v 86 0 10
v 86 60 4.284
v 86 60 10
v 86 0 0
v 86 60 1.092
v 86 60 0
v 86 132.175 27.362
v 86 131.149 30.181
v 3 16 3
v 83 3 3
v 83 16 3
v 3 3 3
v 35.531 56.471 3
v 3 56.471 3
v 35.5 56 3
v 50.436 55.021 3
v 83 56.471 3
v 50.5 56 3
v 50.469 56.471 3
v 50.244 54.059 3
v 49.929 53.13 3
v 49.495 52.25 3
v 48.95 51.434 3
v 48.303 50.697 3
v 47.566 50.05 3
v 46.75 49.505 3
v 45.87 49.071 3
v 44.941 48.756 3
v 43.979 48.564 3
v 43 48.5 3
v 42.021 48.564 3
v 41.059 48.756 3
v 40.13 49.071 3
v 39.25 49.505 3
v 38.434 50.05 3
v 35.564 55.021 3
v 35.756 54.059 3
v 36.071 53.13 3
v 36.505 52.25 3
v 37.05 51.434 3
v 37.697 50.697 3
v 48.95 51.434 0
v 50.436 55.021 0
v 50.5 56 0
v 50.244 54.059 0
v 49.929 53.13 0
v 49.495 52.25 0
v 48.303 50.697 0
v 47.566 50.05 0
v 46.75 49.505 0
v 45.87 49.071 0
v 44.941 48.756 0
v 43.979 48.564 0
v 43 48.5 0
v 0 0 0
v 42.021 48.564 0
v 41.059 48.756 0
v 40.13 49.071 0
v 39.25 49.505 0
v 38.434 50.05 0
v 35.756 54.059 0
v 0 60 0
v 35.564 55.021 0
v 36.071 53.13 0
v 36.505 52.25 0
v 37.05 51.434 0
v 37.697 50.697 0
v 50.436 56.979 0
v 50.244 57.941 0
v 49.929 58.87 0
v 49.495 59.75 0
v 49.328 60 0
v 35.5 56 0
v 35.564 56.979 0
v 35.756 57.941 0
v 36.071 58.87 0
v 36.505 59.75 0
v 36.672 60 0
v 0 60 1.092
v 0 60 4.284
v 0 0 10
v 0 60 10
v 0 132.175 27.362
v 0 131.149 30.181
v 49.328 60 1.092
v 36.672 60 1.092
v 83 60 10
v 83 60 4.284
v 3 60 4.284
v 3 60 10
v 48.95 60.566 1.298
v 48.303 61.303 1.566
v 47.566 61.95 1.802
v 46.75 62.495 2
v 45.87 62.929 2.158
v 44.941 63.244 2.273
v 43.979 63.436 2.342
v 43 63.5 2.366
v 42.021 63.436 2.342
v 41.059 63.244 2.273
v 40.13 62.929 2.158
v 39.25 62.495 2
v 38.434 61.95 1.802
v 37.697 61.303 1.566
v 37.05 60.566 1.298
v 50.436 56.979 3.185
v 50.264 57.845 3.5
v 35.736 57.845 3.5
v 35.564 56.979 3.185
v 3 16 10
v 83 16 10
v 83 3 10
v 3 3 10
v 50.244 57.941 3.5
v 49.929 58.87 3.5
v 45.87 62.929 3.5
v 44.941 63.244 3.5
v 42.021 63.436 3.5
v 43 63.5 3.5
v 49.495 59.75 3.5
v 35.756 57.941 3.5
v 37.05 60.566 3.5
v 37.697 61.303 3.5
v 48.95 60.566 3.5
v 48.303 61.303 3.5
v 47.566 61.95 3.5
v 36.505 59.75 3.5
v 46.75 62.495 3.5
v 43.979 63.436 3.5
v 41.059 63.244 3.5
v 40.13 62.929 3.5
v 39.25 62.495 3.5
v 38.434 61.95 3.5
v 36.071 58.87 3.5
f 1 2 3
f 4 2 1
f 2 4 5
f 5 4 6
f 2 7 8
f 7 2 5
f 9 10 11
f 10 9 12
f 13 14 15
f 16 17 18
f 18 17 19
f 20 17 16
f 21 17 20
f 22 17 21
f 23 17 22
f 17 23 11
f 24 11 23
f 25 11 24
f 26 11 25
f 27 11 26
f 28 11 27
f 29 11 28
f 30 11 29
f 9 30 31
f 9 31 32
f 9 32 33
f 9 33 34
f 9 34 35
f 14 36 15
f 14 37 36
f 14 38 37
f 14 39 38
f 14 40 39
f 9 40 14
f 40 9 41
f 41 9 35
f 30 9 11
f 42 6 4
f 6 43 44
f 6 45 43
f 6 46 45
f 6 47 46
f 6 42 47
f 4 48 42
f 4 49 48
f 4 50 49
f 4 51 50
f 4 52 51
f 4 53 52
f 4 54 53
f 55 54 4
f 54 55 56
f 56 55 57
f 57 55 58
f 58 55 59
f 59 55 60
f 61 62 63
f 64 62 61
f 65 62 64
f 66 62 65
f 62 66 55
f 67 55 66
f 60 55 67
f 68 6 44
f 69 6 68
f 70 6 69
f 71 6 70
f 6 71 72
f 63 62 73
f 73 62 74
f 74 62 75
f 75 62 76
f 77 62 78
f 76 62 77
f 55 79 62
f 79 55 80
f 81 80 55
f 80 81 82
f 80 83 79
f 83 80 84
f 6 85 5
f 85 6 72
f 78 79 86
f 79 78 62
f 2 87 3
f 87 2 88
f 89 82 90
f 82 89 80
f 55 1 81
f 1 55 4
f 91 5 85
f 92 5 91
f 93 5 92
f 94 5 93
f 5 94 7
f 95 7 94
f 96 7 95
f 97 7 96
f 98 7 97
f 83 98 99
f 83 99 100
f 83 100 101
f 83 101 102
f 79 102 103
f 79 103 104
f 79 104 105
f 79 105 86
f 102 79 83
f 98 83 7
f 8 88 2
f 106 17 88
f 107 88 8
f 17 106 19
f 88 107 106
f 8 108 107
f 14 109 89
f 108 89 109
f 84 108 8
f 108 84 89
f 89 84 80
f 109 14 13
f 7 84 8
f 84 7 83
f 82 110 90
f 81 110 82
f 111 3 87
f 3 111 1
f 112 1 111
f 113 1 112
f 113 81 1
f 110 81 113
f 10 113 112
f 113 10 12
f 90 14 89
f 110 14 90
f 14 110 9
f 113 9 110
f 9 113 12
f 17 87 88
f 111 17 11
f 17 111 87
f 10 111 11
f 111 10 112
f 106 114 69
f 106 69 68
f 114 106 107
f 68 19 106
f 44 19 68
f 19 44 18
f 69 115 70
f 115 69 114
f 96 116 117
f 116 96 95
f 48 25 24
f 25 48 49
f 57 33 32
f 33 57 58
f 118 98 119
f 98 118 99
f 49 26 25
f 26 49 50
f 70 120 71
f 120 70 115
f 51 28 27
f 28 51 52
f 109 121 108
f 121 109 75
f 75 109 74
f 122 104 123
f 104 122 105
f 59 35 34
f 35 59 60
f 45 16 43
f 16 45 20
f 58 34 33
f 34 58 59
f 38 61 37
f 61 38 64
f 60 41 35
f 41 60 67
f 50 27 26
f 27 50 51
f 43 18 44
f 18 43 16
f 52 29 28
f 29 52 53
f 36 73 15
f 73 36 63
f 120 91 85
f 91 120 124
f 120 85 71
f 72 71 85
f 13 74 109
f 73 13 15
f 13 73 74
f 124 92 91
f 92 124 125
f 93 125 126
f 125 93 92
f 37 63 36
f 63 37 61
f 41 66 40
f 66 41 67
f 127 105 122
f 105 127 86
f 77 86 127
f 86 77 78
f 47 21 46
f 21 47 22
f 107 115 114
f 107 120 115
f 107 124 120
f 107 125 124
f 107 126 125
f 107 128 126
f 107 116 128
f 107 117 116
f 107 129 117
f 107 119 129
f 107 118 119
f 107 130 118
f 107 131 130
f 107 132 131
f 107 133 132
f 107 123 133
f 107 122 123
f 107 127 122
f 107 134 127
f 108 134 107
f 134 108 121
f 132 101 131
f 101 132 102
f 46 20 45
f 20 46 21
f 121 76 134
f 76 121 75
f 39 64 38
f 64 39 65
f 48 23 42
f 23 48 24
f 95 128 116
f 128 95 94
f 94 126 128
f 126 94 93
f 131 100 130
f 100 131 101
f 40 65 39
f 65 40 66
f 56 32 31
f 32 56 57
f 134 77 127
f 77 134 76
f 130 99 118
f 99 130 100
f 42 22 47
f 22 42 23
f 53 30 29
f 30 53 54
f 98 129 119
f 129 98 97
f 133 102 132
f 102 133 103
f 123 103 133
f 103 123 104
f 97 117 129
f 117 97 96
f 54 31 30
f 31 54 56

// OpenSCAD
// Phone stand — adjustable viewing angle
// Fits phones up to 80mm wide, 12mm thick

$fn = 48;

phone_width = 80;
phone_thickness = 12;
stand_depth = 60;
stand_height = 80;
wall = 3;
angle = 70; // viewing angle from horizontal
lip_height = 10;

module phone_stand() {
    difference() {
        union() {
            // Base plate
            cube([phone_width + wall * 2, stand_depth, wall]);

            // Back support
            translate([0, stand_depth - wall, 0])
                rotate([90 - angle, 0, 0])
                    cube([phone_width + wall * 2, stand_height, wall]);

            // Front lip
            cube([phone_width + wall * 2, wall, lip_height]);

            // Side walls
            cube([wall, stand_depth, lip_height]);
            translate([phone_width + wall, 0, 0])
                cube([wall, stand_depth, lip_height]);
        }

        // Phone slot
        translate([wall, wall, wall])
            cube([phone_width, phone_thickness + 1, lip_height + 1]);

        // Cable hole
        translate([(phone_width + wall * 2) / 2, stand_depth - wall - 1, -0.5])
            cylinder(h=wall + 1, d=15);
    }
}

phone_stand();
